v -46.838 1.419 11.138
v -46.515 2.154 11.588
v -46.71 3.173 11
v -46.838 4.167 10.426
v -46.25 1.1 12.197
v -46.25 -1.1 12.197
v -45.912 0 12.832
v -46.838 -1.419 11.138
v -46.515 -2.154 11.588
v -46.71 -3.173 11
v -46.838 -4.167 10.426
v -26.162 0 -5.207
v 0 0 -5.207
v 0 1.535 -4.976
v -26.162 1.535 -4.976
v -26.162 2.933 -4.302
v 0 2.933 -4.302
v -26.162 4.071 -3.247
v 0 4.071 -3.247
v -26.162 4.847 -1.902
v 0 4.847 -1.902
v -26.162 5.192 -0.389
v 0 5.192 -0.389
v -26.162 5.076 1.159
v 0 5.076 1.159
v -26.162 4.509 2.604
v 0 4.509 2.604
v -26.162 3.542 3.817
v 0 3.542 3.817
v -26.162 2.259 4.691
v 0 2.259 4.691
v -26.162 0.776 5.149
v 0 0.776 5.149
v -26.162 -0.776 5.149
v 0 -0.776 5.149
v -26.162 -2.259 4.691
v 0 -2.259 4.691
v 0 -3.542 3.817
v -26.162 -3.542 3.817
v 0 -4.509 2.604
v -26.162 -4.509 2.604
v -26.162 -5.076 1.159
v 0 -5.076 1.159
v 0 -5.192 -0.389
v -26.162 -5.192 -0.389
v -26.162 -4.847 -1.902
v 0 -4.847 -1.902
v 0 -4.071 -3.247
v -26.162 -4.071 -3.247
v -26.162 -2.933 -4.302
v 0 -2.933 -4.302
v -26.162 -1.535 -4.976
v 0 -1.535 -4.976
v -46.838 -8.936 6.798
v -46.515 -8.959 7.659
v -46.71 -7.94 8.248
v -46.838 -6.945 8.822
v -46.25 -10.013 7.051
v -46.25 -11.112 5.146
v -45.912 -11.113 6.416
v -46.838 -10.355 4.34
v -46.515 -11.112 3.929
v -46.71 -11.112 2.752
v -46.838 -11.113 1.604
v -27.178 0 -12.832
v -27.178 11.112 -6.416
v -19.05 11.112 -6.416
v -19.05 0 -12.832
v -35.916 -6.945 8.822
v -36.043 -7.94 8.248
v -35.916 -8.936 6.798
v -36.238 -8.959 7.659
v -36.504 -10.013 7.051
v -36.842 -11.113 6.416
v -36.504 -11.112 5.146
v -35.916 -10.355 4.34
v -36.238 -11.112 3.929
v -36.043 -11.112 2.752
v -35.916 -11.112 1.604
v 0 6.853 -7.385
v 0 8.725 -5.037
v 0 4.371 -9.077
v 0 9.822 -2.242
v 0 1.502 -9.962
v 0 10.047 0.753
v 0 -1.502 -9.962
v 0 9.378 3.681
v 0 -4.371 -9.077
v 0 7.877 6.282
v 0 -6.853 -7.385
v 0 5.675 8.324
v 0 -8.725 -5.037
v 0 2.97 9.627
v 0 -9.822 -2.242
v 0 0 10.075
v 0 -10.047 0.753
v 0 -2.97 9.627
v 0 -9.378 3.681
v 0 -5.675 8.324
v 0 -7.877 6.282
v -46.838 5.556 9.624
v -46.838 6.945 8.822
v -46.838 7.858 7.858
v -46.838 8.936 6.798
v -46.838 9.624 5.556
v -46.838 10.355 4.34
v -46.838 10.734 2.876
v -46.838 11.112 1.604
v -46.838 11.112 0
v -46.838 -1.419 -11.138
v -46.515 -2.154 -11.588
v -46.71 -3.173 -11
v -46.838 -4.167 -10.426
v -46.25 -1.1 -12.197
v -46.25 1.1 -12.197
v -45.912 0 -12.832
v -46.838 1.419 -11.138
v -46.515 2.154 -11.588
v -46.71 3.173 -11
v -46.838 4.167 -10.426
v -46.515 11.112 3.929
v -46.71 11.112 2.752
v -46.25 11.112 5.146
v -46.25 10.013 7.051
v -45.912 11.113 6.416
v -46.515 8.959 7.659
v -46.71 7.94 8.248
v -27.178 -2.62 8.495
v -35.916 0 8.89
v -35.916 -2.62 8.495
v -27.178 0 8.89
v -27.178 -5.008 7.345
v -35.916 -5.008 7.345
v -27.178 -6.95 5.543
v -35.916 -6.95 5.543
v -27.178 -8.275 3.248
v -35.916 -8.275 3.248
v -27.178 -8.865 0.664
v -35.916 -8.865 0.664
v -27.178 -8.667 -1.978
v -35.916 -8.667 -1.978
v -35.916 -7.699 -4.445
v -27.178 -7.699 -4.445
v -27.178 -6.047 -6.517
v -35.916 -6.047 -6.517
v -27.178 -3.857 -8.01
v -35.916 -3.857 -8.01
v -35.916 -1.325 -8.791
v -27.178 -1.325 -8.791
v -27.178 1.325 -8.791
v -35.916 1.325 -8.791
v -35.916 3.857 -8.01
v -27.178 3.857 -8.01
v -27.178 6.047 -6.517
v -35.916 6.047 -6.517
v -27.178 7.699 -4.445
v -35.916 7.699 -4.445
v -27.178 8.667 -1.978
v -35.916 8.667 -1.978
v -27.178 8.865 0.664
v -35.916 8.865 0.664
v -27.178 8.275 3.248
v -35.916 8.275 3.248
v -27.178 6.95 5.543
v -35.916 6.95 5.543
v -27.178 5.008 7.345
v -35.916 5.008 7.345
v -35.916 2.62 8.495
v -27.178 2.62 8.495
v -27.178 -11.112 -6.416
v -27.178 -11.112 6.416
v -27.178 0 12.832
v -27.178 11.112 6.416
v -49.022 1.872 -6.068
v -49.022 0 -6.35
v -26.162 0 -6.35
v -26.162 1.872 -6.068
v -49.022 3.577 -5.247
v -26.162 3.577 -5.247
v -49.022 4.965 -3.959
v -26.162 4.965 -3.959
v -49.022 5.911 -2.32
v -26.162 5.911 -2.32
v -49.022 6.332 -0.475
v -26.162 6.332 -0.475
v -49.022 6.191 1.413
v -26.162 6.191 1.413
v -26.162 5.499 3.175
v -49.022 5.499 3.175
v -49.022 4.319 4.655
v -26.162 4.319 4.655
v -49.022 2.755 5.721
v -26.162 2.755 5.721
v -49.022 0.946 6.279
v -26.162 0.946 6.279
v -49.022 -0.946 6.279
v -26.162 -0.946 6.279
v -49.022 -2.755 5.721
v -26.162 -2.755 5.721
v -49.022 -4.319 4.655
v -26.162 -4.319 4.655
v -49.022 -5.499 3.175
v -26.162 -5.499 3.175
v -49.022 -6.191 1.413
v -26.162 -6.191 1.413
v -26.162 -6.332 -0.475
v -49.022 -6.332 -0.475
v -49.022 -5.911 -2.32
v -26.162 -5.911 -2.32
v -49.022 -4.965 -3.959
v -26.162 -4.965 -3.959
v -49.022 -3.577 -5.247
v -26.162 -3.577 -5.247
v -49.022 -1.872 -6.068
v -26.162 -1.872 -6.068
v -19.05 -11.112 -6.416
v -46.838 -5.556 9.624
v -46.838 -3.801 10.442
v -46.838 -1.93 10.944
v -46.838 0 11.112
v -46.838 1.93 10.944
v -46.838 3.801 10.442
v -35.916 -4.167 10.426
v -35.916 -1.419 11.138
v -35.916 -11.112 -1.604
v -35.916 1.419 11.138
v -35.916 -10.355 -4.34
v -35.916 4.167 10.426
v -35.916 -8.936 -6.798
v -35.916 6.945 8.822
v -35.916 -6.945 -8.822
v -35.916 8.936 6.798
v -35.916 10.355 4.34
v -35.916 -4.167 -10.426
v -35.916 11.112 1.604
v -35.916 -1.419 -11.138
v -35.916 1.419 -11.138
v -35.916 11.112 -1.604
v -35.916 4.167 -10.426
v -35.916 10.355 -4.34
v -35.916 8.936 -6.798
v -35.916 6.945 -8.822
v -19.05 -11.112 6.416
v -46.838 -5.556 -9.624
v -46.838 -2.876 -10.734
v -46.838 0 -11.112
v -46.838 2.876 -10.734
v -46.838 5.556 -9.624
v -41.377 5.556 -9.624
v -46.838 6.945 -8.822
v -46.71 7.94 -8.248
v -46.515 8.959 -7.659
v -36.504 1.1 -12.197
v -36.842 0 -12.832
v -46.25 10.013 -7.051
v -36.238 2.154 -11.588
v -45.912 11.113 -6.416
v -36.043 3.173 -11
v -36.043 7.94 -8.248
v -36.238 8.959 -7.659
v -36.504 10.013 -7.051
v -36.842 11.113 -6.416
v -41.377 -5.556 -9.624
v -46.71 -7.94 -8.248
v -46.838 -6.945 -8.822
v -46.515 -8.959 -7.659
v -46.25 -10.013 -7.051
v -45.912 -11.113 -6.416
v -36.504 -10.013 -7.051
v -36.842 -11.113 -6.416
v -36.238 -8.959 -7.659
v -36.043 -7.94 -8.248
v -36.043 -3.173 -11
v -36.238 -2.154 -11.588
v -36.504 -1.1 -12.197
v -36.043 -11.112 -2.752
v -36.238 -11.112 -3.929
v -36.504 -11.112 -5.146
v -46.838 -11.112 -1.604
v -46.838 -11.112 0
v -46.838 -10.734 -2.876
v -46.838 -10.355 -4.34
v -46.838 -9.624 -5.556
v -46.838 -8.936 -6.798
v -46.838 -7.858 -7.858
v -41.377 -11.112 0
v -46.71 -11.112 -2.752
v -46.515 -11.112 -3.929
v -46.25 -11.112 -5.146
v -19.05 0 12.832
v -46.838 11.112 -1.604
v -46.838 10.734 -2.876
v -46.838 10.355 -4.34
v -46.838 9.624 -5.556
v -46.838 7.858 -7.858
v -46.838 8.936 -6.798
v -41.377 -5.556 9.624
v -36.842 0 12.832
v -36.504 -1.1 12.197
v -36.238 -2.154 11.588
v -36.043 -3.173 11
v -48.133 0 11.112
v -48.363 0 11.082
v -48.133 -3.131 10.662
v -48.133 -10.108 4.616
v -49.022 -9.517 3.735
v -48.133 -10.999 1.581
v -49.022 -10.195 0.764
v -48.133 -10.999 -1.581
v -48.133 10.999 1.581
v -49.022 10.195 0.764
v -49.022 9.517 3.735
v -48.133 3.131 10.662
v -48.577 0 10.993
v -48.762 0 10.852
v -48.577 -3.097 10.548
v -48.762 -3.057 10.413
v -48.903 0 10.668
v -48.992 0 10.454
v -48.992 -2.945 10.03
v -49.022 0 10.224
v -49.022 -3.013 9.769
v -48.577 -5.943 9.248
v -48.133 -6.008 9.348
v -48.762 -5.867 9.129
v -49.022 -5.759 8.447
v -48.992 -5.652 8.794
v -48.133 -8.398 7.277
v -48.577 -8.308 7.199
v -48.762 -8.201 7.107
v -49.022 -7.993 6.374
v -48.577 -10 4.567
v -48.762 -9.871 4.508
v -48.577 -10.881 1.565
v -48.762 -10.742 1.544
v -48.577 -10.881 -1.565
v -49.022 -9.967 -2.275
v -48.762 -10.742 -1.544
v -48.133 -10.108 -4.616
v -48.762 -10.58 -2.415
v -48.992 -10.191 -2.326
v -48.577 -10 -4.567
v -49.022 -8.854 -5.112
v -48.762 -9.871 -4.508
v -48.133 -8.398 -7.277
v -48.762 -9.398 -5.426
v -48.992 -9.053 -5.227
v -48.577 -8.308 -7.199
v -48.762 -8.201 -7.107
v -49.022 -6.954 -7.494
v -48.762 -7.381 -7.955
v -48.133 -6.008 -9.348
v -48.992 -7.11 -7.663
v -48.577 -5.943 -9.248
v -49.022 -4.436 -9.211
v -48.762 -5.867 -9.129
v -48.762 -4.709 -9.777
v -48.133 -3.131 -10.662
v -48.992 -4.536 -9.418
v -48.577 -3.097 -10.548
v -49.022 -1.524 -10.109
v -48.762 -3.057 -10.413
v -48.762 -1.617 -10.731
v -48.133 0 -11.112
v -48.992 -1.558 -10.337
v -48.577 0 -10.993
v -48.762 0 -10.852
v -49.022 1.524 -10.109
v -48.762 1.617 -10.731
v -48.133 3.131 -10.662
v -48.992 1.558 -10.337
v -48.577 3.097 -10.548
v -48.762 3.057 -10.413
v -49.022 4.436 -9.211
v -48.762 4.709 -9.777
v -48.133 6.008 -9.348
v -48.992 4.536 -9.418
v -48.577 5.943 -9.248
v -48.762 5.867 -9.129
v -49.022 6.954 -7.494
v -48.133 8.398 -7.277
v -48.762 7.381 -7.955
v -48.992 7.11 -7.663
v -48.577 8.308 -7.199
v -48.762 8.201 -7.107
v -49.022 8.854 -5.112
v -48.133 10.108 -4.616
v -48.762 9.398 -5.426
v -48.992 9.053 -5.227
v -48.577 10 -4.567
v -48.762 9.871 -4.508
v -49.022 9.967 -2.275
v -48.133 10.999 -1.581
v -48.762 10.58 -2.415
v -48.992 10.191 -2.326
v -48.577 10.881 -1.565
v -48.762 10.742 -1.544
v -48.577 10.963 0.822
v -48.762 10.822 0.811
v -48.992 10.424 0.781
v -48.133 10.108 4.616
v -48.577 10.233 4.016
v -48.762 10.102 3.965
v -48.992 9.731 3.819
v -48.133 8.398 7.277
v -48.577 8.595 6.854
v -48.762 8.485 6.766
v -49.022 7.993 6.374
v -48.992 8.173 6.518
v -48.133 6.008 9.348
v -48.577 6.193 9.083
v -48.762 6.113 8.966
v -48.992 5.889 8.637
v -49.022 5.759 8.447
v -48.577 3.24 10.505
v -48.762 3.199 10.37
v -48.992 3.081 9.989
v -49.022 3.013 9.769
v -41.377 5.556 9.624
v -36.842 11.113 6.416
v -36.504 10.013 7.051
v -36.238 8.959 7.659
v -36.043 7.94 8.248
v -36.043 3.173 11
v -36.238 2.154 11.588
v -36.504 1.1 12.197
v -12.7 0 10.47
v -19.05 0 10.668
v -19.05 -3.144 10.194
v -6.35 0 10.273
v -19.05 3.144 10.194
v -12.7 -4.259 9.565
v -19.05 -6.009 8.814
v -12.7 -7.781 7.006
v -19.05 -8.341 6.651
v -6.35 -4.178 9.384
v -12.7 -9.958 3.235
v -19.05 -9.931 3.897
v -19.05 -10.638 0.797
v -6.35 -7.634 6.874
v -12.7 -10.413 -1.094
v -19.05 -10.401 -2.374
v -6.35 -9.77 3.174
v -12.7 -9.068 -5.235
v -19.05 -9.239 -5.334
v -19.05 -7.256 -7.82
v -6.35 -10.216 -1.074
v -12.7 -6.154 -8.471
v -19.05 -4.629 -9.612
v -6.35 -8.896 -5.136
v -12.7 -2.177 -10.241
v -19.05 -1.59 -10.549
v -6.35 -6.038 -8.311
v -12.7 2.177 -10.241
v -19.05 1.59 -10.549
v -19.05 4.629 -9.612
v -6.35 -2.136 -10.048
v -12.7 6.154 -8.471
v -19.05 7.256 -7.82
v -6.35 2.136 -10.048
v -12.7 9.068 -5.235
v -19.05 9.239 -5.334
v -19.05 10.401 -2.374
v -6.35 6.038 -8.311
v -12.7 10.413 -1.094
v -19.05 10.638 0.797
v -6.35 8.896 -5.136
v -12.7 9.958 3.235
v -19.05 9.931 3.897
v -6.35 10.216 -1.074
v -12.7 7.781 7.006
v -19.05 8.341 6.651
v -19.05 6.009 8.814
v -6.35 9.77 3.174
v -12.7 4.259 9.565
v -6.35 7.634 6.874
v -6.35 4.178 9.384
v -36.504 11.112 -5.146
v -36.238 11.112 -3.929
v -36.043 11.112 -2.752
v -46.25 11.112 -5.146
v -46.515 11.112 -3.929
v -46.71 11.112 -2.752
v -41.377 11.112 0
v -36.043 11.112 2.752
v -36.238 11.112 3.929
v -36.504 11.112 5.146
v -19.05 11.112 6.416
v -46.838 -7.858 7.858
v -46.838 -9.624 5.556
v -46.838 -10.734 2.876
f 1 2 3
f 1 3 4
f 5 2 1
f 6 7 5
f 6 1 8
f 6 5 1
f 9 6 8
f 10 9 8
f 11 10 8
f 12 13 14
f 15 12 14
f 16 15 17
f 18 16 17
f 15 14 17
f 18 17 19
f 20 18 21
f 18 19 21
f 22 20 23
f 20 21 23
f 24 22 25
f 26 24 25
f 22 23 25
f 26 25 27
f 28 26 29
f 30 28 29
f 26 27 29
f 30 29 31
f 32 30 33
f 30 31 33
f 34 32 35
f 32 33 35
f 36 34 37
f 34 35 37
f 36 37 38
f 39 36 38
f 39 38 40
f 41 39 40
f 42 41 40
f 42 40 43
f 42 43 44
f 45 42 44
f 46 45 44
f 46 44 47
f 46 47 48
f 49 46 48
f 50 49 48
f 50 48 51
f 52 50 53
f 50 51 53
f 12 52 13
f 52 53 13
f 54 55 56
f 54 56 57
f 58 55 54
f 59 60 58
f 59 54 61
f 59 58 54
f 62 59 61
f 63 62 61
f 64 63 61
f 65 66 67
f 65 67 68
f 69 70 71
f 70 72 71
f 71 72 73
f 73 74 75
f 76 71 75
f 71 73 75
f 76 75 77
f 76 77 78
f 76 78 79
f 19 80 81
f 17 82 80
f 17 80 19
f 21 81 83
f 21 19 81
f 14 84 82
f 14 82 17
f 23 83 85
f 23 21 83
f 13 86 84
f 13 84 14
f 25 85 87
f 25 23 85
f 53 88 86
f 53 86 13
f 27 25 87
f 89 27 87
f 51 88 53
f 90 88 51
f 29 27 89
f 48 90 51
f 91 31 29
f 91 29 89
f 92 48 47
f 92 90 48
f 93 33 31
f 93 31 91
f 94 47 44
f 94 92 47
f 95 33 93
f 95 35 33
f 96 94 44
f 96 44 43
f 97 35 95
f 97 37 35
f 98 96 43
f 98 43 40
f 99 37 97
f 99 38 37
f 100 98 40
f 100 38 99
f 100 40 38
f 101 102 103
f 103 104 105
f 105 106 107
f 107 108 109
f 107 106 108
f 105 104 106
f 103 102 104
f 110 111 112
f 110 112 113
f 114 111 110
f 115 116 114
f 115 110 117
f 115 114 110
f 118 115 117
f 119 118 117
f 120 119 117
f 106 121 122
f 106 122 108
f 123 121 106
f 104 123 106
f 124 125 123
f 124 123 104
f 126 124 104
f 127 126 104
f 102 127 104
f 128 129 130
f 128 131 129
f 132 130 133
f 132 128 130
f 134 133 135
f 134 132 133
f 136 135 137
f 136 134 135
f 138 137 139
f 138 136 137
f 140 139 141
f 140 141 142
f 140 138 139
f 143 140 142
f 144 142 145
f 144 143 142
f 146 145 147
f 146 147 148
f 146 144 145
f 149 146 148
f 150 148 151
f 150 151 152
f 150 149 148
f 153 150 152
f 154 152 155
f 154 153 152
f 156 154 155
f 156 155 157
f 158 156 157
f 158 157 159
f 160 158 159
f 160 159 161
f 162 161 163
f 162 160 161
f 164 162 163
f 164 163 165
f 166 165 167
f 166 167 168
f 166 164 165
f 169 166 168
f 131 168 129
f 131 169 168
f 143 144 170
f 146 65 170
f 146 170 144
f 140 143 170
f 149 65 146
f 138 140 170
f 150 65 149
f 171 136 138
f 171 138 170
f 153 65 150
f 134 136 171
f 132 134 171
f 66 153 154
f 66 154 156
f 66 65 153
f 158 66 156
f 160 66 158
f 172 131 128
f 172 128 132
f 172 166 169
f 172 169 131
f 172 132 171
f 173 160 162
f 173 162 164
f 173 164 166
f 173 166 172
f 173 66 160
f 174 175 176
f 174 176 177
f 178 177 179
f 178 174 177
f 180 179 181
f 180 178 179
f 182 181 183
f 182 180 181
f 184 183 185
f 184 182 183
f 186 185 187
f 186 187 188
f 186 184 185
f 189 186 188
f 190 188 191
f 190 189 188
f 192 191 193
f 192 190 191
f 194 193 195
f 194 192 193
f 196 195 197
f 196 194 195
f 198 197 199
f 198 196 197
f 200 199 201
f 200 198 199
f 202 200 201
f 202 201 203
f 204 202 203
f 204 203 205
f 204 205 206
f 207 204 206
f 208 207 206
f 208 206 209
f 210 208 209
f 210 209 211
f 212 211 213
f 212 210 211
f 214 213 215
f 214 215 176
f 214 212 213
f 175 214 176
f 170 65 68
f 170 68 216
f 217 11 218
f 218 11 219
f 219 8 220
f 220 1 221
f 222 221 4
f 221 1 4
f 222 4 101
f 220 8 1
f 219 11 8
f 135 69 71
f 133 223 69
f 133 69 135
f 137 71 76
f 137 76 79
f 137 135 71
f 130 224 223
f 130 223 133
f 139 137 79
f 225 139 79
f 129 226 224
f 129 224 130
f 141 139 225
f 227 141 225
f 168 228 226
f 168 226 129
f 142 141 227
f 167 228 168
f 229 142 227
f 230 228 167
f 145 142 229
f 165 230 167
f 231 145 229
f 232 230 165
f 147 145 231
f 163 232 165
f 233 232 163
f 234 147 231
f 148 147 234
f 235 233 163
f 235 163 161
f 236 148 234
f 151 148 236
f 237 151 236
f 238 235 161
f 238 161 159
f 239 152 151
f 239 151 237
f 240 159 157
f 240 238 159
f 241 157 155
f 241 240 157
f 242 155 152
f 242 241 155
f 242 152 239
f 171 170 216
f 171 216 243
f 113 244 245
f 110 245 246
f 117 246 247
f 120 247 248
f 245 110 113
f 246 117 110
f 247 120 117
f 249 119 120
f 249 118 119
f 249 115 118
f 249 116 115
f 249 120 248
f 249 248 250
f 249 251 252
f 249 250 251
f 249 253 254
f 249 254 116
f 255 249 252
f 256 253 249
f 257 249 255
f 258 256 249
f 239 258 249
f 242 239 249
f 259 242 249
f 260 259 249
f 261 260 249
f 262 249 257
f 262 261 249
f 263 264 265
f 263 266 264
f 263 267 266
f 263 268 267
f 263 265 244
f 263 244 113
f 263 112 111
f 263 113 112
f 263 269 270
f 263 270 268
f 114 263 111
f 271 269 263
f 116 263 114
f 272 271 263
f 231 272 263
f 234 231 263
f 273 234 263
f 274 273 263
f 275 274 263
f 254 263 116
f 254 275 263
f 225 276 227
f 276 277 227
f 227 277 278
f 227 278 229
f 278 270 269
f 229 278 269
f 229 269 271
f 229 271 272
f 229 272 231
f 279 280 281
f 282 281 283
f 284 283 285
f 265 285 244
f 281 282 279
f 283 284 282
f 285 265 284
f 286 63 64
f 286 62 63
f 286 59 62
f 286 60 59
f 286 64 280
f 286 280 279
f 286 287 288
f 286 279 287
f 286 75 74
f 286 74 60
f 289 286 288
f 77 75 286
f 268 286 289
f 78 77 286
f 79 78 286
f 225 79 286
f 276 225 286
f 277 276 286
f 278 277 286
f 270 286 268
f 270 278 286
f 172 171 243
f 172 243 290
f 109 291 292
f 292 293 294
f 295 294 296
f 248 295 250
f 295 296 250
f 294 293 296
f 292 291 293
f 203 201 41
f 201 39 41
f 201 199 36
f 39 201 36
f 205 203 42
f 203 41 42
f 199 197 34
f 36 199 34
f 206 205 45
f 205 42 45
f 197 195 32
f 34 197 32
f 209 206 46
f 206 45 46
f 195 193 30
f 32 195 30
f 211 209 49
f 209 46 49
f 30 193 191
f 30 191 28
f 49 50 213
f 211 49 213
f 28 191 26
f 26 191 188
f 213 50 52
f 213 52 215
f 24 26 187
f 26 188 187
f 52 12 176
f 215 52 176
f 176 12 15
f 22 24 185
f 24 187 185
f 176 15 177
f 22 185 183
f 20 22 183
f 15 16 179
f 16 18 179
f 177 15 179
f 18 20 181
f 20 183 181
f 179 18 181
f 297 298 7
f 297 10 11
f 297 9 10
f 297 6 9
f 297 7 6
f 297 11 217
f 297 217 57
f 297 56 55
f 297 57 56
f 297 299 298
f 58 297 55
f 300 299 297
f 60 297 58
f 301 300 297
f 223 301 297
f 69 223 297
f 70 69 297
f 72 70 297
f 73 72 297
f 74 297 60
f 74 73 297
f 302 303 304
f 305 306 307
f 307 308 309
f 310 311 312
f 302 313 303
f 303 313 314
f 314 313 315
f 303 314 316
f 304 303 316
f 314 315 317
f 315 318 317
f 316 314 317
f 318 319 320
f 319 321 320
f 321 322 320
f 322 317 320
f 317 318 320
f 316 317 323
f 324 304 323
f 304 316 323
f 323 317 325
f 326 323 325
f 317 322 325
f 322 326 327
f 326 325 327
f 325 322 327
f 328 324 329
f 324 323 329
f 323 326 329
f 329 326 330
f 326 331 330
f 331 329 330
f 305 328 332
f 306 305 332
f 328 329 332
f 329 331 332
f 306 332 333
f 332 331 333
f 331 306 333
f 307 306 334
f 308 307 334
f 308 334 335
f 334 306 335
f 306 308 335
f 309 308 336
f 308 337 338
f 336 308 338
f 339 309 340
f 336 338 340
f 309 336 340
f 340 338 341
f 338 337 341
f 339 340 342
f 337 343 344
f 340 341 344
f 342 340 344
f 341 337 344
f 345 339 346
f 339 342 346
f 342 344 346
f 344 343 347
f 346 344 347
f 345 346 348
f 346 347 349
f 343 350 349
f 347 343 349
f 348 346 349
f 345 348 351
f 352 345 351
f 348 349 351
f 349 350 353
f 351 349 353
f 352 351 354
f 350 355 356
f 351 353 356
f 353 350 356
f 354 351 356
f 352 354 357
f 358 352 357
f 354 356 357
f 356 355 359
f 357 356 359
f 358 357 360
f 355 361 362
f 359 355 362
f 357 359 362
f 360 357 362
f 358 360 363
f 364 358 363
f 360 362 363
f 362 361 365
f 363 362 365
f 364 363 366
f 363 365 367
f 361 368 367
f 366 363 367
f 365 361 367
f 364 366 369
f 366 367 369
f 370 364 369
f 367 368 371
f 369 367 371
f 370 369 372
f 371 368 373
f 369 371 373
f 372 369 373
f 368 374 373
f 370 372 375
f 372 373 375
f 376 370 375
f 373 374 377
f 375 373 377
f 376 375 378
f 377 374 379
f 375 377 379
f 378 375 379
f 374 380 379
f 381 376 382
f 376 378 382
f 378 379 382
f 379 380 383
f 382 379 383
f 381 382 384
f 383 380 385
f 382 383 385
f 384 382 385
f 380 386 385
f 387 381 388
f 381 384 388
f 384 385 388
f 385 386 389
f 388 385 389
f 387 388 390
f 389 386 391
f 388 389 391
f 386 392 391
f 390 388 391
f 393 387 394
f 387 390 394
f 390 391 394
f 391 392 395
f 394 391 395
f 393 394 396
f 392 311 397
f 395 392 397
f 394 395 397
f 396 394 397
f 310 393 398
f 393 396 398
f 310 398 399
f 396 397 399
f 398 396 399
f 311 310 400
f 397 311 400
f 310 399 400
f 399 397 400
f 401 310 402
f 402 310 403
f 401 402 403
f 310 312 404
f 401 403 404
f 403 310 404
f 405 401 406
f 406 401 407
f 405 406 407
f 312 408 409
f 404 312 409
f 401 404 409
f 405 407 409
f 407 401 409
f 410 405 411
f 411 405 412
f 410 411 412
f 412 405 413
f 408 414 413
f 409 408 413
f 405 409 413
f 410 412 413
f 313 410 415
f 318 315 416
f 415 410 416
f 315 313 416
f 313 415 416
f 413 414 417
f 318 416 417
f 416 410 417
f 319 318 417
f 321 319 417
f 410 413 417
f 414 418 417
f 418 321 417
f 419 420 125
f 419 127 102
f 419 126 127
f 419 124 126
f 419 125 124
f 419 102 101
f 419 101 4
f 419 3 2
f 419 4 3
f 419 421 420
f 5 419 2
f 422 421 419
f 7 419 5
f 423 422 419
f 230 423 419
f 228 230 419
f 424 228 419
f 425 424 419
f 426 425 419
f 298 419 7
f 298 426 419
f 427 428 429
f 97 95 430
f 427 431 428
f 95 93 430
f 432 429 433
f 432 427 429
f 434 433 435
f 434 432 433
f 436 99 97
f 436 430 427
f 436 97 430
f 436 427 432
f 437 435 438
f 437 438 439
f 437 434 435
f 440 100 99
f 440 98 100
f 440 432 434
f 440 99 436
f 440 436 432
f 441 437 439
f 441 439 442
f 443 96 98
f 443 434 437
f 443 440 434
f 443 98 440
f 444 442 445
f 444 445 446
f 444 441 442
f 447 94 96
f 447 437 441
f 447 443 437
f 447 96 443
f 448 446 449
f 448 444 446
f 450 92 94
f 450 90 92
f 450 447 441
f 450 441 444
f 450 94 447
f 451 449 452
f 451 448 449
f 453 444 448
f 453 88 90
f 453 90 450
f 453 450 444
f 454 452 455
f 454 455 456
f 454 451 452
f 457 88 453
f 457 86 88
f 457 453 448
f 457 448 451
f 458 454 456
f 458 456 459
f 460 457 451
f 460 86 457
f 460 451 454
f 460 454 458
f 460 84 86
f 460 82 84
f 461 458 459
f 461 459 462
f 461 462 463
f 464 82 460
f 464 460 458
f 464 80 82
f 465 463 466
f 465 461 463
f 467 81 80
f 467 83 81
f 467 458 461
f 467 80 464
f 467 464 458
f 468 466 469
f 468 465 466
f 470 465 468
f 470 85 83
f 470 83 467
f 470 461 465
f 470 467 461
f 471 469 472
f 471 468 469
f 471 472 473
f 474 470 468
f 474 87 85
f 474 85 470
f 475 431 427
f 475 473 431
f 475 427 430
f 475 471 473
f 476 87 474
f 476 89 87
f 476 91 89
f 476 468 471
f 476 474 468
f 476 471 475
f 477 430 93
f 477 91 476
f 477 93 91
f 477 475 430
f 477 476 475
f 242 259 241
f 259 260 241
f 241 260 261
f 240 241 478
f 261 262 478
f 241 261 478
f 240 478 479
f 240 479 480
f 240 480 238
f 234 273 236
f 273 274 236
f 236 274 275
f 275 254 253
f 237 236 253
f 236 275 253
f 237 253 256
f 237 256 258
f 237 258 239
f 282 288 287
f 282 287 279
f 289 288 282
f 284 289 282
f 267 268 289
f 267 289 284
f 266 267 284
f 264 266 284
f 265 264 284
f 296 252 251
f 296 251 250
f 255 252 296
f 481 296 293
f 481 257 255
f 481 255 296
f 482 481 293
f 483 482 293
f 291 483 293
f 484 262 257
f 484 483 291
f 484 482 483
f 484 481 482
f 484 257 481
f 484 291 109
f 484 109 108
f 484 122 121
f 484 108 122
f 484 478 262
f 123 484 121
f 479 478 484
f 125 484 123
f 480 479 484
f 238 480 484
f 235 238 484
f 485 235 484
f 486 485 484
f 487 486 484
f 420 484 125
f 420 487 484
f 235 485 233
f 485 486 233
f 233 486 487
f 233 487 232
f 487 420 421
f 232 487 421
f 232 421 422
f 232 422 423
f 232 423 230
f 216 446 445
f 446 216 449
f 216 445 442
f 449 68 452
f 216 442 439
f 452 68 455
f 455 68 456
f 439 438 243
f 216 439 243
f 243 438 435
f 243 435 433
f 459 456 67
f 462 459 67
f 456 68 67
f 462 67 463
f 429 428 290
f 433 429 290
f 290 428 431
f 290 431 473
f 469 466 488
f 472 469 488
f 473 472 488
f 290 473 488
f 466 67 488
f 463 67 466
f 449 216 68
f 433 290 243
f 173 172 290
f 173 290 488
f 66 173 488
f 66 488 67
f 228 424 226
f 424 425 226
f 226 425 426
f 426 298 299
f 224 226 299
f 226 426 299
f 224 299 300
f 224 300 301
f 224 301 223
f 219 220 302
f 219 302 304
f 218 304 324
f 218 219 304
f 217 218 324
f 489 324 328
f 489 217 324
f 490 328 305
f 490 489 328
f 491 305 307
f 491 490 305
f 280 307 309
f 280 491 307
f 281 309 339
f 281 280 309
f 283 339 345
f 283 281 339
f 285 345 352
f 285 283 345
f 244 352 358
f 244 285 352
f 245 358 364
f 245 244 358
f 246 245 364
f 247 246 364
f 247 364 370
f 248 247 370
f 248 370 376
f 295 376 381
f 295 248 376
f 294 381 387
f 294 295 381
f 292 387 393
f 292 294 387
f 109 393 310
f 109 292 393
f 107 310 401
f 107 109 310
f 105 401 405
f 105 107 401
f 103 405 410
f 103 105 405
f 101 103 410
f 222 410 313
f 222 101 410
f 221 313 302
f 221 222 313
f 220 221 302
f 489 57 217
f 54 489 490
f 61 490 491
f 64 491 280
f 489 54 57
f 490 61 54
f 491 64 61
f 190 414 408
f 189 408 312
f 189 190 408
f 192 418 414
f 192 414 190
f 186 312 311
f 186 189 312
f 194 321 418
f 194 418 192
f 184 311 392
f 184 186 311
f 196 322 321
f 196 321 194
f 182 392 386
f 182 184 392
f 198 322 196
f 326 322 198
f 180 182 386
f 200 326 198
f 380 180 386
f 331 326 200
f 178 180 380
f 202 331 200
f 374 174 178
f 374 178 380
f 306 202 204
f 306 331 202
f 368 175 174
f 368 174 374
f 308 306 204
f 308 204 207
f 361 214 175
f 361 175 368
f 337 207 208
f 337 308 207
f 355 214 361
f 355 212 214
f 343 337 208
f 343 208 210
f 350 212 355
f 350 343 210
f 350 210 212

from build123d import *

# Parameters (mm, degrees)
HEX1_DEPTH         = 5.461
HEX2_DEPTH         = 8.128
BODYFILLET_R       = 0.889
DSCH_R             = 6.35
CUT_EXTRUDED_DEPTH = 22.86
SKETCH_E_R         = 5.207
CUT_EXTRUDEE_DEPTH = 26.162


with BuildPart() as part:
    # BodySch → Body (revolve)
    with BuildSketch(Plane.XY, mode=Mode.PRIVATE) as body_sk:
        Polygon((-49.022, 0), (-49.022, 11.1125), (-41.3766, 11.1125), (-41.3766, 8.89), (-27.178, 8.89), (-27.178, 10.668), (-19.05, 10.668), (0, 10.074876486), (0, 0), align=None)
    revolve(body_sk.sketch.rotate(Axis((-103.68469285, 0, 0), (1, 0, 0)), 90), axis=Axis((-103.68469285, 0, 0), (1, 0, 0)))

    # Hex1Sch_G → Hex1 (add, symmetric)
    with BuildSketch(Plane(origin=(-41.3766, 0, 0), x_dir=(0, 0, -1), z_dir=(1, 0, 0))):
        Polygon((12.831609733, 0), (6.415804866, 11.1125), (-6.415804866, 11.1125), (-12.831609733, 0), (-6.415804866, -11.1125), (6.415804866, -11.1125), align=None)
    extrude(amount=HEX1_DEPTH, both=True)

    # Hex2Sch_F → Hex2 (add)
    with BuildSketch(Plane.ZY.offset(27.178)):
        Polygon((12.831609733, 0), (6.415804866, 11.1125), (-6.415804866, 11.1125), (-12.831609733, 0), (-6.415804866, -11.1125), (6.415804866, -11.1125), align=None)
    extrude(amount=-HEX2_DEPTH)

    # BodyFillet
    bodyfillet_edges = [part.edges().sort_by_distance(p)[0] for p in [
        (-49.022, 0, -11.1125),
    ]]
    fillet(bodyfillet_edges, radius=BODYFILLET_R)

    # HexfilletSch → Hexfillet (revolve, cut)
    with BuildSketch(Plane(origin=(0, 0, 0), x_dir=(1, 0, 0), z_dir=(0, 1, 0)), mode=Mode.PRIVATE) as hexfillet_sk:
        Polygon((-46.8376, 11.227658516), (-45.911558333, 12.831609733), (-46.8376, 12.831609733), align=None)
        Polygon((-35.9156, 11.227658516), (-36.841641667, 12.831609733), (-35.9156, 12.831609733), align=None)
    revolve(hexfillet_sk.sketch.rotate(Axis((-41.994761709, 0, 0), (1, 0, 0)), 150), axis=Axis((-41.994761709, 0, 0), (1, 0, 0)), mode=Mode.SUBTRACT)

    # DSch → Cut-ExtrudeD (cut)
    with BuildSketch(Plane(origin=(-49.022, 0, 0), x_dir=(0, 0, -1), z_dir=(1, 0, 0))):
        Circle(DSCH_R)
    extrude(amount=CUT_EXTRUDED_DEPTH, mode=Mode.SUBTRACT)

    # Sketch E → Cut-ExtrudeE (cut)
    with BuildSketch(Plane(origin=(0, 0, 0), x_dir=(0, 0, -1), z_dir=(1, 0, 0))):
        Circle(SKETCH_E_R)
    extrude(amount=-CUT_EXTRUDEE_DEPTH, mode=Mode.SUBTRACT)


solid = part.part
